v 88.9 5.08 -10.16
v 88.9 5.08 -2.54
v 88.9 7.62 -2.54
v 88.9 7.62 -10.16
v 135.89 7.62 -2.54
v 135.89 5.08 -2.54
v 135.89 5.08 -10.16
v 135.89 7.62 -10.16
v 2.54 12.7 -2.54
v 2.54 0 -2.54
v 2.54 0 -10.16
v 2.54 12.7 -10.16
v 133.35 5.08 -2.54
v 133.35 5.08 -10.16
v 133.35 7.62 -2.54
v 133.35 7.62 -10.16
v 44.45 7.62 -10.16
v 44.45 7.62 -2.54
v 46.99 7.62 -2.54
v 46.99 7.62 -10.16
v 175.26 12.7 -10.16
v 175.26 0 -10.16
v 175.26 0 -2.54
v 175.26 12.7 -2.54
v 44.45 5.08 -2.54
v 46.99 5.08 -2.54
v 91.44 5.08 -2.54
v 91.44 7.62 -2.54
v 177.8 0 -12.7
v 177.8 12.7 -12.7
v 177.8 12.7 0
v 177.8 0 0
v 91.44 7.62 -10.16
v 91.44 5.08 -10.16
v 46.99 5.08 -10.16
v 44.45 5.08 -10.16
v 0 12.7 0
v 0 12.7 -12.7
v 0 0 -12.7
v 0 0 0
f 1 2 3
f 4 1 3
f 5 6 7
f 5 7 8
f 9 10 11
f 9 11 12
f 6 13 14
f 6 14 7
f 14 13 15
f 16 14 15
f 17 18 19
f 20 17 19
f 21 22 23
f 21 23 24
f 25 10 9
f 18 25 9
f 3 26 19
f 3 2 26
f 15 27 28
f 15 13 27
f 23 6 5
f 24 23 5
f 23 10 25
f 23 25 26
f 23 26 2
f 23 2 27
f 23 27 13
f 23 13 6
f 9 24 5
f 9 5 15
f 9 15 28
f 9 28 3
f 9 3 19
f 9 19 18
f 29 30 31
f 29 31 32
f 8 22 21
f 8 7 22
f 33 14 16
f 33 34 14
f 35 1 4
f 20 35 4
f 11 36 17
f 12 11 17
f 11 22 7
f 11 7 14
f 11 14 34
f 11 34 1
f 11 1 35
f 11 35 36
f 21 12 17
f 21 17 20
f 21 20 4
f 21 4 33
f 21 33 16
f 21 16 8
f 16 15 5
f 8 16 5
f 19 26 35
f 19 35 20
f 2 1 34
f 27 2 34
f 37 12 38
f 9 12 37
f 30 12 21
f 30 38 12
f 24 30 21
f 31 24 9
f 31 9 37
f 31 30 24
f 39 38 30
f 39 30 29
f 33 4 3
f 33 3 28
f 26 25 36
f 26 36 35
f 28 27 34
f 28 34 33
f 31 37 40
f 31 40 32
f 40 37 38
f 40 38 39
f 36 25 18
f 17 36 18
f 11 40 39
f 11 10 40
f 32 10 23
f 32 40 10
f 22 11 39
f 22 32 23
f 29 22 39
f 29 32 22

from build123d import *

# Parameters (mm, degrees)
F0_W     = 12.7
F0_H     = 2.54
F3_W     = 2.54
F3_H     = 2.54
F4_DEPTH = 12.7


with BuildPart() as f2:
    # F2: sweep along a path in F1
    with BuildLine(Plane.XZ) as f2_path:
        Line((0, 0), (177.8, 0))
        Line((177.8, 0), (177.8, -12.7))
        Line((177.8, -12.7), (0, -12.7))
        Line((0, -12.7), (0, 0))
    # F0 (on Right) → F2 (sweep)
    with BuildSketch(Plane.YZ):
        with Locations((6.35, -1.27)):
            Rectangle(F0_W, F0_H)
    sweep(path=f2_path.line, transition=Transition.RIGHT)

    # F3 (on face) → F4 (join)
    with BuildSketch(Plane.XY):
        with Locations((45.72, 6.35)):
            Rectangle(F3_W, F3_H)
        with Locations((90.17, 6.35)):
            Rectangle(F3_W, F3_H)
        with Locations((134.62, 6.35)):
            Rectangle(F3_W, F3_H)
    extrude(amount=-F4_DEPTH)


solid = f2.part
